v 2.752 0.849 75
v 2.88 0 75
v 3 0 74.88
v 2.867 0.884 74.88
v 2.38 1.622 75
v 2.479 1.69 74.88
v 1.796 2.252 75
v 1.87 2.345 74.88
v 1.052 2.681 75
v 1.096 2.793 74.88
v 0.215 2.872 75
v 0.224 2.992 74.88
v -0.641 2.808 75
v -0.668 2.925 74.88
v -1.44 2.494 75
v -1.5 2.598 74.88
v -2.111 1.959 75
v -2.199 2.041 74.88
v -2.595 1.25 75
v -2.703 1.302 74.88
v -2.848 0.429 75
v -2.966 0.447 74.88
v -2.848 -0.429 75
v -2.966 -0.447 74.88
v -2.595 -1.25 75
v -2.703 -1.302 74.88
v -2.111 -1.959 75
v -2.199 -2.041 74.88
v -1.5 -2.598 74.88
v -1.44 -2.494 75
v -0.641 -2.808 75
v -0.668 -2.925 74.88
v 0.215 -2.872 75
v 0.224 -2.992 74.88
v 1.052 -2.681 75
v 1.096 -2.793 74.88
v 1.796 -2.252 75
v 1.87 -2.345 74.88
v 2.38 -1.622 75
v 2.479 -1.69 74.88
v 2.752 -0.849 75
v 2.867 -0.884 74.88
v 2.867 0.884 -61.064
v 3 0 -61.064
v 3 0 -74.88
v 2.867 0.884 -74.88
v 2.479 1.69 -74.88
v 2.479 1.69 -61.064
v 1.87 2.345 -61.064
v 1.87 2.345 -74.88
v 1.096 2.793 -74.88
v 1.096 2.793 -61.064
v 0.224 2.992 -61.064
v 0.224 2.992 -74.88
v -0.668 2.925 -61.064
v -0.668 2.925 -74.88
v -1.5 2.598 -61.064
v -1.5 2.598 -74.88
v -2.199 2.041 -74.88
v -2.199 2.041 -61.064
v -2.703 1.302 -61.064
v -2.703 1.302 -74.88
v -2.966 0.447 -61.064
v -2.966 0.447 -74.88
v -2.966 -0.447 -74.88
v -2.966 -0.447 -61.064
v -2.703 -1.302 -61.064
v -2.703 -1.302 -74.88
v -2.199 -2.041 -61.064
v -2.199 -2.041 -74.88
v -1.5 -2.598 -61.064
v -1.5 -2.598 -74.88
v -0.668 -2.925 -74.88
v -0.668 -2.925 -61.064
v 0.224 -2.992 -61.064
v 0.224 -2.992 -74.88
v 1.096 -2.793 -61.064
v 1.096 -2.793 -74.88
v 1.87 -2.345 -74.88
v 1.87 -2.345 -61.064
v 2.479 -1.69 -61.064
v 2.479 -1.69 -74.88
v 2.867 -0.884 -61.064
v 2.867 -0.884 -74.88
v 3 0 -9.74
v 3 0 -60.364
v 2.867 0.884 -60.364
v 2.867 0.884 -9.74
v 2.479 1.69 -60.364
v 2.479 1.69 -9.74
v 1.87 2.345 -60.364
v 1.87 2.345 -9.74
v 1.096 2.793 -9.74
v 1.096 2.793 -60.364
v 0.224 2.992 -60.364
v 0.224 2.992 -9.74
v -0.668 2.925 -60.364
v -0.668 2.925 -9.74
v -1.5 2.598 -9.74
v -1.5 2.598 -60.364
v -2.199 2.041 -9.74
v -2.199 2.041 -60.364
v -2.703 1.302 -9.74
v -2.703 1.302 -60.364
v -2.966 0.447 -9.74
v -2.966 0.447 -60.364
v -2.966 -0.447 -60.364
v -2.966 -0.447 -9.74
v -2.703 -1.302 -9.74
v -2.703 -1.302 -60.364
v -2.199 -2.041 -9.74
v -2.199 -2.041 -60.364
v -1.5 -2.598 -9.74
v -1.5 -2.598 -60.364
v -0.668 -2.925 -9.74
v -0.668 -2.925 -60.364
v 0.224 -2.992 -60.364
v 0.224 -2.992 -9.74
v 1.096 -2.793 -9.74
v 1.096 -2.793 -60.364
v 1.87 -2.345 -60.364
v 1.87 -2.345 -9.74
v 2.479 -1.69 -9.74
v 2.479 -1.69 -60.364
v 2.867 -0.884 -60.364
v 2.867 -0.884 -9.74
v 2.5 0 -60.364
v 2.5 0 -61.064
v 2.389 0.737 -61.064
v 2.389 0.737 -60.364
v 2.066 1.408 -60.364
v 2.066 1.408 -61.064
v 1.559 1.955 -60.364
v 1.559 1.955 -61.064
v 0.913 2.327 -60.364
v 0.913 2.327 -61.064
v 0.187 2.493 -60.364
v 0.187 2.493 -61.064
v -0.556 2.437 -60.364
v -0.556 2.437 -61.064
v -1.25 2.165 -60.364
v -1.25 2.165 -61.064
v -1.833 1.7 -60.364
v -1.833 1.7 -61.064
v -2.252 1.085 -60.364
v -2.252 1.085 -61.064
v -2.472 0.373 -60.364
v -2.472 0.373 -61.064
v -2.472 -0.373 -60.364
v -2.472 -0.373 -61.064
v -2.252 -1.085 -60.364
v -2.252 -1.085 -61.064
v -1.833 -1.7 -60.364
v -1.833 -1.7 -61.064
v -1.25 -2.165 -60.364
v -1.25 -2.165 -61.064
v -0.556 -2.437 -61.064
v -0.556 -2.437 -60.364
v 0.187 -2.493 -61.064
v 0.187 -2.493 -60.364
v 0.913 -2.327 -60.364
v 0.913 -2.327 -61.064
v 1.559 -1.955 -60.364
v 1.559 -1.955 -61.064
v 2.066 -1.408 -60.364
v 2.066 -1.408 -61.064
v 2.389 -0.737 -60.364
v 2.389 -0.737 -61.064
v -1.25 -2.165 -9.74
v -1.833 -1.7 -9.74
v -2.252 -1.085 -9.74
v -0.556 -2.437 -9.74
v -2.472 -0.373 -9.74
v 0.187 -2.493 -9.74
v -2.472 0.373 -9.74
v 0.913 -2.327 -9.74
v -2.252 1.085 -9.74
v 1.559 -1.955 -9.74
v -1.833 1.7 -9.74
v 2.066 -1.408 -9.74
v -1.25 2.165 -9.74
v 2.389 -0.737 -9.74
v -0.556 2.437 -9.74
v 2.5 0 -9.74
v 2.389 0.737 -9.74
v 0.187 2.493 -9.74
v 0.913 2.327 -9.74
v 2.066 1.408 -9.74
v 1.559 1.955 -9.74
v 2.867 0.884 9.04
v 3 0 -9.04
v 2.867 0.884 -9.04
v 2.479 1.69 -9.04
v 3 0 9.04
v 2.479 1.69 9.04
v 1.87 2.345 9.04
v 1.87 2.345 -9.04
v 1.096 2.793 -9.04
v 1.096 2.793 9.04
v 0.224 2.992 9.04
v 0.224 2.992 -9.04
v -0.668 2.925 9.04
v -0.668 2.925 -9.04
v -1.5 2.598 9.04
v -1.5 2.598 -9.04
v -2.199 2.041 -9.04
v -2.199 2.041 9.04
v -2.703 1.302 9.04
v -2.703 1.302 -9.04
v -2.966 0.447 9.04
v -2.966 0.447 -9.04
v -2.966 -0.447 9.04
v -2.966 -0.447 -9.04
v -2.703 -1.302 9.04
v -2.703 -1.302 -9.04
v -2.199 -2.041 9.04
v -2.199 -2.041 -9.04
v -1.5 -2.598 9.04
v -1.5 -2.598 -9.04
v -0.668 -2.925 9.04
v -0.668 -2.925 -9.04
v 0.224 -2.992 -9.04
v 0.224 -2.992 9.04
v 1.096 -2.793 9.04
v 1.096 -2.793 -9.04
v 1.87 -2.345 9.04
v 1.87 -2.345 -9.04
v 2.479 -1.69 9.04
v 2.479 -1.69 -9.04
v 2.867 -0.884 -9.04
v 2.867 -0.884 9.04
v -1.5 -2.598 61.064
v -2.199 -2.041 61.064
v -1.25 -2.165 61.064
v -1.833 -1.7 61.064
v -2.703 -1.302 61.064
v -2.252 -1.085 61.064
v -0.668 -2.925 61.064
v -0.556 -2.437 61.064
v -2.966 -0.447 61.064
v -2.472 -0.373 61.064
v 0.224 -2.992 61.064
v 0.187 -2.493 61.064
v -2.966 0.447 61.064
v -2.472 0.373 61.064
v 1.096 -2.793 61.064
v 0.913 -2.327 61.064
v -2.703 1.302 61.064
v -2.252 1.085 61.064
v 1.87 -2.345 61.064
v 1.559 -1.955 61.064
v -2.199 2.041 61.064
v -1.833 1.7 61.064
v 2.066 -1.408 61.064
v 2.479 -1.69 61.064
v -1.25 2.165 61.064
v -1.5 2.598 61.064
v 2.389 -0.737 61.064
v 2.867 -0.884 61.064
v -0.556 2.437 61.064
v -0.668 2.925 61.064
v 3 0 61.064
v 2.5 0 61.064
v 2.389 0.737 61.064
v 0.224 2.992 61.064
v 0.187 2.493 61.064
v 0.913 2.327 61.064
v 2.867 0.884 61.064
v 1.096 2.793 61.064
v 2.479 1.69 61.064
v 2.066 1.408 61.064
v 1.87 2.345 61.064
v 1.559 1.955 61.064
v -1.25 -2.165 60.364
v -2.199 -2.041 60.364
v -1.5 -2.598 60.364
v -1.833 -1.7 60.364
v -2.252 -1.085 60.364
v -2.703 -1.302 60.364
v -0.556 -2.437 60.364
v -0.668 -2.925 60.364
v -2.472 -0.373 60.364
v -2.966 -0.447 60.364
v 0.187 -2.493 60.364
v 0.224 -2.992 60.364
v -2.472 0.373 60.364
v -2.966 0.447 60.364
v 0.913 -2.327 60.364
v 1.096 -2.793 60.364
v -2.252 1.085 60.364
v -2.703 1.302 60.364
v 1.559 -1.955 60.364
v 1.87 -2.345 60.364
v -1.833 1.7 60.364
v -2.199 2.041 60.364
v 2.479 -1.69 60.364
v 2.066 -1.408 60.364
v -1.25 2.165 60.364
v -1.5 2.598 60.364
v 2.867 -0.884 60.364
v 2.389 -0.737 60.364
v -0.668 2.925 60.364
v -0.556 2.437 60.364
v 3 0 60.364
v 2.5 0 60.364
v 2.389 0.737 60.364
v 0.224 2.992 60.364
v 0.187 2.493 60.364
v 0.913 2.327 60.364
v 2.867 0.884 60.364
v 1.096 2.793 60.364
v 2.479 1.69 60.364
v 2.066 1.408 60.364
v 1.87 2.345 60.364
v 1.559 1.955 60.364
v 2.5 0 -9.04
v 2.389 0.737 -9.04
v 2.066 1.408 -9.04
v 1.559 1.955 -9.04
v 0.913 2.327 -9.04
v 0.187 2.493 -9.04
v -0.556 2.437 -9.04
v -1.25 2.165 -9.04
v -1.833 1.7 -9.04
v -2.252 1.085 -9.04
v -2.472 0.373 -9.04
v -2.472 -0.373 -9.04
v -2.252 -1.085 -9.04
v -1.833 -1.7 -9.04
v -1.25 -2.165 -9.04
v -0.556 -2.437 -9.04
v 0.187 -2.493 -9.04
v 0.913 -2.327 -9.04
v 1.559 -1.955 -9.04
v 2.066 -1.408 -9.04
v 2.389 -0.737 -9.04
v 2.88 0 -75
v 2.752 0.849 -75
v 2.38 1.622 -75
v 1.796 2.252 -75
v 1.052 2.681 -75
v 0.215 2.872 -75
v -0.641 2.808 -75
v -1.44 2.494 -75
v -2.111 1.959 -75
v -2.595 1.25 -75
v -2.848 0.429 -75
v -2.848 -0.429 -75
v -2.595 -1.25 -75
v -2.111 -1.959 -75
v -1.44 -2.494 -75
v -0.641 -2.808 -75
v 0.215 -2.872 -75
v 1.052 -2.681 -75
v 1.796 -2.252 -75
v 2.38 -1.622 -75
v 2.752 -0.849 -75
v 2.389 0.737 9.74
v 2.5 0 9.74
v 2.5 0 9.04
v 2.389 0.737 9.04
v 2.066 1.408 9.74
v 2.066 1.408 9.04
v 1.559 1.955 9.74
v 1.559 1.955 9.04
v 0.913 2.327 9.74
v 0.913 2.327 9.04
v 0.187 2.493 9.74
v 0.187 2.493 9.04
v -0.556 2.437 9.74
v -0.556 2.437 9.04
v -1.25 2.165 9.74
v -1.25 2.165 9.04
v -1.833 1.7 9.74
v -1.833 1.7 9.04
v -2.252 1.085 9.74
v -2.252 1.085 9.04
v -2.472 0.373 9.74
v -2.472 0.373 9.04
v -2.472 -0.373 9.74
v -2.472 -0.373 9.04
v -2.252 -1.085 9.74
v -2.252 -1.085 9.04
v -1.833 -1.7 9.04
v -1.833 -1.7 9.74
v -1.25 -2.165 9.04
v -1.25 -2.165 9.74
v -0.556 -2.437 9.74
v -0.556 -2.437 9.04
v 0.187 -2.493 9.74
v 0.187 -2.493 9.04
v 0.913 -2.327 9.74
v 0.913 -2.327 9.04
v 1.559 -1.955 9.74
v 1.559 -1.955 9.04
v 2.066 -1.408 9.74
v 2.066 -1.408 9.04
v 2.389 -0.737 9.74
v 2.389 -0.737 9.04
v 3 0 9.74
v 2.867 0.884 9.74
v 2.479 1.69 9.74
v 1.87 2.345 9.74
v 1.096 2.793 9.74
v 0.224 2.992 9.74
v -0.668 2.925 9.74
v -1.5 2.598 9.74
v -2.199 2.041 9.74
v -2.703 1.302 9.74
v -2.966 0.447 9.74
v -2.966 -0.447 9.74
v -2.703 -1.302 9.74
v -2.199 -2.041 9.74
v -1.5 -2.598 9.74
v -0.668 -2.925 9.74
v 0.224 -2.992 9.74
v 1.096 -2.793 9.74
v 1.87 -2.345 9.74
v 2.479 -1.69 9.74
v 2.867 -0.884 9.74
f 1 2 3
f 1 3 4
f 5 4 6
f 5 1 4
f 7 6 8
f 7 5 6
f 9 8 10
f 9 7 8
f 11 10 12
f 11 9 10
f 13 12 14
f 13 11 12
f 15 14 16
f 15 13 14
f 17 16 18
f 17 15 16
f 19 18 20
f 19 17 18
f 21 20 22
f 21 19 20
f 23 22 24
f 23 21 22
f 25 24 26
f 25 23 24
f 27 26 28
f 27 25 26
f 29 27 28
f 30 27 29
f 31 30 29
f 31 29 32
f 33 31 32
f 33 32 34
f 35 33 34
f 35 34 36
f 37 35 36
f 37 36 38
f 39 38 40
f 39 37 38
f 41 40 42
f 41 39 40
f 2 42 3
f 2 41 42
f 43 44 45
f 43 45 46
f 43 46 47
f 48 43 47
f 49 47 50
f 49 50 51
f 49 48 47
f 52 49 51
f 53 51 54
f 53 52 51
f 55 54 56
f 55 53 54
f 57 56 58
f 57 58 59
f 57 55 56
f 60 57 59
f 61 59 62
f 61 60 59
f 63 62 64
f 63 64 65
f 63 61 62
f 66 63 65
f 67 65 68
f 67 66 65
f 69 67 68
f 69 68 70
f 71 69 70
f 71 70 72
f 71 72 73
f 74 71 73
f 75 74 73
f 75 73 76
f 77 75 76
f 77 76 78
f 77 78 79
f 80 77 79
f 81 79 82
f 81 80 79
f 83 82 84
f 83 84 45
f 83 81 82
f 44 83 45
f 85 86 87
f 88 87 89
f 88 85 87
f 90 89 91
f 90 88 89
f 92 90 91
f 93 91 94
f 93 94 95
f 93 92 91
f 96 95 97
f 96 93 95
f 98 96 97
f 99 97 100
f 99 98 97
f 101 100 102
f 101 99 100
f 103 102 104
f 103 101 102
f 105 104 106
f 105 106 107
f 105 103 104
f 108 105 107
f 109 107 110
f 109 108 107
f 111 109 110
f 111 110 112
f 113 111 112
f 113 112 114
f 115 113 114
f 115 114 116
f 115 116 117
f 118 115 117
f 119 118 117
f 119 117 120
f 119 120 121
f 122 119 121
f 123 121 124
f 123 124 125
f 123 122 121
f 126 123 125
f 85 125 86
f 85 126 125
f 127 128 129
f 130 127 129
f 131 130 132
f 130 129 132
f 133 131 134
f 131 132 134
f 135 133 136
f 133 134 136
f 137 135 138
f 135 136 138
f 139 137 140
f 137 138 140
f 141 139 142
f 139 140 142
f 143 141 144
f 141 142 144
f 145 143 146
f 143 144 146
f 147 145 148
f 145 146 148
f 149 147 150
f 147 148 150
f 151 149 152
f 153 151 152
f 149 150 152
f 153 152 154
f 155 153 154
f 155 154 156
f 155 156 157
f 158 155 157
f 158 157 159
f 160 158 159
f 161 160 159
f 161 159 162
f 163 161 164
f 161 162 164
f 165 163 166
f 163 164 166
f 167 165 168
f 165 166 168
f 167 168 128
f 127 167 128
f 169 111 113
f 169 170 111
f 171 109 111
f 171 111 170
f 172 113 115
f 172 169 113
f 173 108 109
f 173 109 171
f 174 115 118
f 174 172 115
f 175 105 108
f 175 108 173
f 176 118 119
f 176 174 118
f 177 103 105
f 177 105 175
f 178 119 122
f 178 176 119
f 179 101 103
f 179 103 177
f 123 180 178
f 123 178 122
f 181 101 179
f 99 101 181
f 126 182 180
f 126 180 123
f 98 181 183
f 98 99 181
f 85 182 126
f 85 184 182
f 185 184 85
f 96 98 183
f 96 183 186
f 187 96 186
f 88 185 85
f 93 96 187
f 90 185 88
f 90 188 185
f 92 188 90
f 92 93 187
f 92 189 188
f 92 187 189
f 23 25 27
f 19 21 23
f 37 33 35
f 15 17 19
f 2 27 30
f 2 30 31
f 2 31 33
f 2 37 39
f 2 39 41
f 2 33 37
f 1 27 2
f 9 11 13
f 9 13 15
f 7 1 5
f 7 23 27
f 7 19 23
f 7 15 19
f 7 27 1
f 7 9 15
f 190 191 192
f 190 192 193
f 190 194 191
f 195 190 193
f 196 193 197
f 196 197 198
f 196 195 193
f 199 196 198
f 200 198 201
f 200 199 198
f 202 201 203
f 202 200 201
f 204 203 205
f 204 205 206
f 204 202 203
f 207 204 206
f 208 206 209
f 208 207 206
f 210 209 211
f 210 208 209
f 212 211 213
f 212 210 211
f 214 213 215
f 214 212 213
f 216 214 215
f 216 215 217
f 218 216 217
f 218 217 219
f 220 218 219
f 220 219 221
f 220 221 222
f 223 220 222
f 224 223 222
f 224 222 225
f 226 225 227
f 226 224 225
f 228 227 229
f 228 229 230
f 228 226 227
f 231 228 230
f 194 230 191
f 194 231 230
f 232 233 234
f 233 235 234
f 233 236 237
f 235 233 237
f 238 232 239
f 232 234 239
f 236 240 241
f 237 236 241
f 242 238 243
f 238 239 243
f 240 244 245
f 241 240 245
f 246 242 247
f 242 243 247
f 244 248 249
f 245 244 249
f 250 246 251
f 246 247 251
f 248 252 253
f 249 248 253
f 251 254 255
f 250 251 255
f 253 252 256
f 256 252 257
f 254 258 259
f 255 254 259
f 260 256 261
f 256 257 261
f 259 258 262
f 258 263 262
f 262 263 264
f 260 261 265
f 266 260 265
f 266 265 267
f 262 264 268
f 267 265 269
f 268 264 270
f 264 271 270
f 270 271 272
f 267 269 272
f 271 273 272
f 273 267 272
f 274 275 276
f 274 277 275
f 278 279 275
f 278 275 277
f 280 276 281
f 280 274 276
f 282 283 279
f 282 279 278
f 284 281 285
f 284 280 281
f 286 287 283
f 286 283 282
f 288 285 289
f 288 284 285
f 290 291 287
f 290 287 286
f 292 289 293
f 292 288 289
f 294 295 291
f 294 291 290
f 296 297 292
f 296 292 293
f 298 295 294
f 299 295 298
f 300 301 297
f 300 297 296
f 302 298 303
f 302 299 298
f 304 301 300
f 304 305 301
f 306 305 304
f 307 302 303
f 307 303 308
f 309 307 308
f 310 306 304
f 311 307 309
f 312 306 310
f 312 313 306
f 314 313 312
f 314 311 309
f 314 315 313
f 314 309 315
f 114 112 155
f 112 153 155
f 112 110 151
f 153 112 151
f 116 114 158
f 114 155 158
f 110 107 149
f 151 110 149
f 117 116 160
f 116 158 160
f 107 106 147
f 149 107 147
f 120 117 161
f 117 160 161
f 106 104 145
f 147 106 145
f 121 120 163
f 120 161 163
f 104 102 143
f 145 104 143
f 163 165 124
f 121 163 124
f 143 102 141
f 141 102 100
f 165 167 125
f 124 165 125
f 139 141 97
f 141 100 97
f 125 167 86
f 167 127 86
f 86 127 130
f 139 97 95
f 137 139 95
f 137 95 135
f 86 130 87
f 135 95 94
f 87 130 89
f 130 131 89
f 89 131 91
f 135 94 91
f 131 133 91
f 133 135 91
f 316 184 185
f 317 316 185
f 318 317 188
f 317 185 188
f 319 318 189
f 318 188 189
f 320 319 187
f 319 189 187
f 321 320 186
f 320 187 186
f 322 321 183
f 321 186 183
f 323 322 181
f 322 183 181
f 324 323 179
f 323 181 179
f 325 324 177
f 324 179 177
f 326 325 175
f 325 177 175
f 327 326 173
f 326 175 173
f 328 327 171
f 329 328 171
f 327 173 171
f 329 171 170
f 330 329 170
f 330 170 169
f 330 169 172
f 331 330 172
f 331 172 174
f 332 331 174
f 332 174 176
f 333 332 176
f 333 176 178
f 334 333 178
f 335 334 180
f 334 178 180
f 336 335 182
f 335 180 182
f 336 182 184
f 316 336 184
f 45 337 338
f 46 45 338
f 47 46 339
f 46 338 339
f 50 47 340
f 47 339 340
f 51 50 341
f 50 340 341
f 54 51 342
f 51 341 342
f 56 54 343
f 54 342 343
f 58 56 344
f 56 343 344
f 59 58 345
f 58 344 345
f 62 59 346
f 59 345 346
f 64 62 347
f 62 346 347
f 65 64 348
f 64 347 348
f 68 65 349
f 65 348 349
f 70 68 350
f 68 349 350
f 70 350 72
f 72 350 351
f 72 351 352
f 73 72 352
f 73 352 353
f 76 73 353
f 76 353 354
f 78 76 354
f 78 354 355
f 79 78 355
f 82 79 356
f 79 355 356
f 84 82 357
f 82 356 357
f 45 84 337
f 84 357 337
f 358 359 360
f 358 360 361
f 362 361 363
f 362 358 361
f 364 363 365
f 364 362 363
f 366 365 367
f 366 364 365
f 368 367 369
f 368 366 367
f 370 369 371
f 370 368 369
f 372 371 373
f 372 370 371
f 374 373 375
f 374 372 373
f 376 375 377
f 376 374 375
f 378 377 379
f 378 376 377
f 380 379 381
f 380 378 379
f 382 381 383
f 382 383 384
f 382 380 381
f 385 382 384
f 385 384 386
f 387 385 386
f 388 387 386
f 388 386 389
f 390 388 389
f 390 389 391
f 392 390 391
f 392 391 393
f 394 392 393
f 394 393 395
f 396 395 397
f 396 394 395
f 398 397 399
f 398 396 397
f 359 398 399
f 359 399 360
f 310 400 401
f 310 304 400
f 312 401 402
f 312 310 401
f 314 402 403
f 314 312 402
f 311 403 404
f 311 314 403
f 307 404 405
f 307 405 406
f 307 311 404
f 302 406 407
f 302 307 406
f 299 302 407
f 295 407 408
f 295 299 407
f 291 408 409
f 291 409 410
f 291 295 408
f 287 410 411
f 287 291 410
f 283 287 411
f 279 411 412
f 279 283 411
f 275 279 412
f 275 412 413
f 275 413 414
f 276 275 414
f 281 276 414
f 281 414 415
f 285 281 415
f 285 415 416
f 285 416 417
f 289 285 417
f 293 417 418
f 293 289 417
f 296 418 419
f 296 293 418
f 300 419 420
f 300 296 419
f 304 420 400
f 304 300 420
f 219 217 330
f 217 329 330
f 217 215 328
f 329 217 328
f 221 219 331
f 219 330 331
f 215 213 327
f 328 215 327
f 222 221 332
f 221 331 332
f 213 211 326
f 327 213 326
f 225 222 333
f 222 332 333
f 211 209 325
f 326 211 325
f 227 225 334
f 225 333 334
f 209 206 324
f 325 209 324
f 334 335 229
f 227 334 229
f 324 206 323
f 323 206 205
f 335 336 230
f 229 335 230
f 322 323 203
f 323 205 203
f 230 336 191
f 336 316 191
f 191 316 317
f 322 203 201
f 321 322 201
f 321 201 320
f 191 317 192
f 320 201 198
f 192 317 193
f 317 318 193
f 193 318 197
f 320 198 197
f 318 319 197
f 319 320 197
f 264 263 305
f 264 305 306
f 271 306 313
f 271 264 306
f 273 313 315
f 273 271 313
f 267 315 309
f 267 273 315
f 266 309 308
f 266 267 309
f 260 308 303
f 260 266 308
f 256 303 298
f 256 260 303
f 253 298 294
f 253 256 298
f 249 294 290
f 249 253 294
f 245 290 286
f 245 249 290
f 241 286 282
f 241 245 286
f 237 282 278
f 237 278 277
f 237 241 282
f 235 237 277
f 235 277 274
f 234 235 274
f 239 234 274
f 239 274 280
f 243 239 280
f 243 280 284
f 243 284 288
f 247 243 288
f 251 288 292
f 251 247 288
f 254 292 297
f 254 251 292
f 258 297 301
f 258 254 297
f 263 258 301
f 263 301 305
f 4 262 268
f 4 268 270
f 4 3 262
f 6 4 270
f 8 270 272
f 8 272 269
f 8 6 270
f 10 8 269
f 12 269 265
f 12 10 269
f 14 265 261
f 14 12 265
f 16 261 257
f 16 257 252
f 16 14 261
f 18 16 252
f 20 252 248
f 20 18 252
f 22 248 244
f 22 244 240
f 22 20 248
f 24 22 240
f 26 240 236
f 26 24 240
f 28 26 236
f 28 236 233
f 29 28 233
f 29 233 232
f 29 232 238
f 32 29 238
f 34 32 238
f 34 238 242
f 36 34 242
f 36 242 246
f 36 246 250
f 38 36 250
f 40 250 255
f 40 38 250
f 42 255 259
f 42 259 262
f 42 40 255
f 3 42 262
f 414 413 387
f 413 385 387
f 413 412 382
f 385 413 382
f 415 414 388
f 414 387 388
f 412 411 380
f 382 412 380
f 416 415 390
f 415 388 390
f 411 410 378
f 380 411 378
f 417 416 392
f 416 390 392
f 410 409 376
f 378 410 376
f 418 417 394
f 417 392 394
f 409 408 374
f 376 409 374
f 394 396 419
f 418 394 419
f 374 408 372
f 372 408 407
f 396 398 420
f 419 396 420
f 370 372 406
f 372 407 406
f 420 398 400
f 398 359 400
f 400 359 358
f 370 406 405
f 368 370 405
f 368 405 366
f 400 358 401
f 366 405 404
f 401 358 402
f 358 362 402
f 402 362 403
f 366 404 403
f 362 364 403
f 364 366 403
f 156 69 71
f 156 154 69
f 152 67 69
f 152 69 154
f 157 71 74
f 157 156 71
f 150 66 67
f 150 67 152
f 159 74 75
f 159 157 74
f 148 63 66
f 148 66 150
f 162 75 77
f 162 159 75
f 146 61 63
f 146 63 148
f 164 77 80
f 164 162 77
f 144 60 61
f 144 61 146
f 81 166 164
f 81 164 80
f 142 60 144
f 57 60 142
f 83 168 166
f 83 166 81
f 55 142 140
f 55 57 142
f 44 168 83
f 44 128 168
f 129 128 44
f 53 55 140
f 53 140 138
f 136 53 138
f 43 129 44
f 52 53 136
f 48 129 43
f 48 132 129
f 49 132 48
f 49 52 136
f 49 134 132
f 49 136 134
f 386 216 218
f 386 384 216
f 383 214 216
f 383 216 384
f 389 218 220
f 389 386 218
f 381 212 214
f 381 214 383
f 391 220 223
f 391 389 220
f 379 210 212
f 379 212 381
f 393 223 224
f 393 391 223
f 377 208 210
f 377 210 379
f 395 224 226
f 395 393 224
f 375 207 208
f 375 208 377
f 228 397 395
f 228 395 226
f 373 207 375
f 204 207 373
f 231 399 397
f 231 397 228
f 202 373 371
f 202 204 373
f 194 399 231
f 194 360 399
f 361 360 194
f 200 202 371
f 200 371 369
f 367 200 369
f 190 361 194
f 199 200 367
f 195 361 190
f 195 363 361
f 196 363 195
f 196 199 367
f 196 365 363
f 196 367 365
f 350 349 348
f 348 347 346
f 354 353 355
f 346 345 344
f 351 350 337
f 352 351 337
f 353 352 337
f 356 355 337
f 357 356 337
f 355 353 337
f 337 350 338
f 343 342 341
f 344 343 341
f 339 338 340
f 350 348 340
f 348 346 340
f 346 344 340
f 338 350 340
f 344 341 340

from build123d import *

# Parameters (mm, degrees)
SKETCH2_R                = 3
BOSS_EXTRUDE1_DEPTH      = 75
BOSS_EXTRUDE1_DEPTH_BACK = 75
CHAMFER1_SIZE            = 0.12
CUT_EXTRUDE1_START       = -13.936057366
SKETCH3_R                = 3
SKETCH3_R_2              = 2.5
CUT_EXTRUDE1_DEPTH       = 0.7
CUT_EXTRUDE2_START       = -65.26
SKETCH3_2_R              = 3
SKETCH3_2_R_2            = 2.5
CUT_EXTRUDE2_DEPTH       = 0.7


with BuildPart() as part:
    # Sketch2 → Boss-Extrude1 (new body, two sides)
    with BuildSketch(Plane.XY) as boss_extrude1_sk:
        Circle(SKETCH2_R)
    extrude(amount=BOSS_EXTRUDE1_DEPTH)
    extrude(boss_extrude1_sk.sketch, amount=-BOSS_EXTRUDE1_DEPTH_BACK)

    # Chamfer1
    chamfer1_edges = [part.edges().sort_by_distance(p)[0] for p in [
        (-3, 0, -75),
        (-3, 0, 75),
    ]]
    chamfer(chamfer1_edges, length=CHAMFER1_SIZE)

    # Sketch3 → Cut-Extrude1 (cut)
    with BuildSketch(Plane.XY.offset(75).offset(CUT_EXTRUDE1_START)):
        Circle(SKETCH3_R)
        Circle(SKETCH3_R_2, mode=Mode.SUBTRACT)
    cut_extrude1 = extrude(amount=-CUT_EXTRUDE1_DEPTH, mode=Mode.SUBTRACT)

    # Mirror1: Cut-Extrude1 across plane
    add(cut_extrude1.mirror(Plane.XY), mode=Mode.SUBTRACT)

    # Sketch3<2> → Cut-Extrude2 (cut)
    with BuildSketch(Plane.XY.offset(75).offset(CUT_EXTRUDE2_START)):
        Circle(SKETCH3_2_R)
        Circle(SKETCH3_2_R_2, mode=Mode.SUBTRACT)
    cut_extrude2 = extrude(amount=-CUT_EXTRUDE2_DEPTH, mode=Mode.SUBTRACT)

    # Mirror2: Cut-Extrude2 across plane
    add(cut_extrude2.mirror(Plane.XY), mode=Mode.SUBTRACT)


solid = part.part
